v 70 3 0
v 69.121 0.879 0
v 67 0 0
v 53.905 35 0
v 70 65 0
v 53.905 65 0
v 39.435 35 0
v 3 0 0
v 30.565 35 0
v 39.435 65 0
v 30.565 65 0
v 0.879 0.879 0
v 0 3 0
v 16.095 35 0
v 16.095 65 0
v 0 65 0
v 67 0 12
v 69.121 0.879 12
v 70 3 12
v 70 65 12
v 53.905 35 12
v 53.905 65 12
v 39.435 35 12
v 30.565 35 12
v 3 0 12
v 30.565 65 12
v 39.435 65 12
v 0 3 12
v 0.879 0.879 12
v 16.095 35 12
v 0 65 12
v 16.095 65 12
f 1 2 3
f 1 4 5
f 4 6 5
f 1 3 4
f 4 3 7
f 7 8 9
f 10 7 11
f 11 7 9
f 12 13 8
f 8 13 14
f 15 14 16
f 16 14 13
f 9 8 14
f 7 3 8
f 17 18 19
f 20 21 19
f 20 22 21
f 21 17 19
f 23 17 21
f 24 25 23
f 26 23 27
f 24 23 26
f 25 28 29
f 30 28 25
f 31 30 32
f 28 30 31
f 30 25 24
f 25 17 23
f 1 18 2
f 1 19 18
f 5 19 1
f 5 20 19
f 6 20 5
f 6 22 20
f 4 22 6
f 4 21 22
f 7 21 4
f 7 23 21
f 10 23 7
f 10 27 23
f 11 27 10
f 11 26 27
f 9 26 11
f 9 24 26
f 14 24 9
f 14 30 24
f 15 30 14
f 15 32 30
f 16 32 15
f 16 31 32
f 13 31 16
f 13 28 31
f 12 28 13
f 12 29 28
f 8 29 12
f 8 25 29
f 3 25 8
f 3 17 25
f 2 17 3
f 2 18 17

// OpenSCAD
$fn = 32;

// ----------------------------------------------------------------------
// Window plate: 70 x 65 mm, 2 open windows
// ----------------------------------------------------------------------

// --- parameters (mm) ---
profile_height = 12;      // extrusion height
profile_points = 16;      // points of the closed outline

profile = [[0, 3], [0.879, 0.879], [3, 0], [67, 0], [69.121, 0.879], [70, 3], [70, 65], [53.905, 65], [53.905, 35], [39.435, 35], [39.435, 65], [30.565, 65], [30.565, 35], [16.095, 35], [16.095, 65], [0, 65]];  // single closed polygon, 16 points, counter clockwise

// --- the one profile operation ---
linear_extrude(height = profile_height) polygon(points = profile);
